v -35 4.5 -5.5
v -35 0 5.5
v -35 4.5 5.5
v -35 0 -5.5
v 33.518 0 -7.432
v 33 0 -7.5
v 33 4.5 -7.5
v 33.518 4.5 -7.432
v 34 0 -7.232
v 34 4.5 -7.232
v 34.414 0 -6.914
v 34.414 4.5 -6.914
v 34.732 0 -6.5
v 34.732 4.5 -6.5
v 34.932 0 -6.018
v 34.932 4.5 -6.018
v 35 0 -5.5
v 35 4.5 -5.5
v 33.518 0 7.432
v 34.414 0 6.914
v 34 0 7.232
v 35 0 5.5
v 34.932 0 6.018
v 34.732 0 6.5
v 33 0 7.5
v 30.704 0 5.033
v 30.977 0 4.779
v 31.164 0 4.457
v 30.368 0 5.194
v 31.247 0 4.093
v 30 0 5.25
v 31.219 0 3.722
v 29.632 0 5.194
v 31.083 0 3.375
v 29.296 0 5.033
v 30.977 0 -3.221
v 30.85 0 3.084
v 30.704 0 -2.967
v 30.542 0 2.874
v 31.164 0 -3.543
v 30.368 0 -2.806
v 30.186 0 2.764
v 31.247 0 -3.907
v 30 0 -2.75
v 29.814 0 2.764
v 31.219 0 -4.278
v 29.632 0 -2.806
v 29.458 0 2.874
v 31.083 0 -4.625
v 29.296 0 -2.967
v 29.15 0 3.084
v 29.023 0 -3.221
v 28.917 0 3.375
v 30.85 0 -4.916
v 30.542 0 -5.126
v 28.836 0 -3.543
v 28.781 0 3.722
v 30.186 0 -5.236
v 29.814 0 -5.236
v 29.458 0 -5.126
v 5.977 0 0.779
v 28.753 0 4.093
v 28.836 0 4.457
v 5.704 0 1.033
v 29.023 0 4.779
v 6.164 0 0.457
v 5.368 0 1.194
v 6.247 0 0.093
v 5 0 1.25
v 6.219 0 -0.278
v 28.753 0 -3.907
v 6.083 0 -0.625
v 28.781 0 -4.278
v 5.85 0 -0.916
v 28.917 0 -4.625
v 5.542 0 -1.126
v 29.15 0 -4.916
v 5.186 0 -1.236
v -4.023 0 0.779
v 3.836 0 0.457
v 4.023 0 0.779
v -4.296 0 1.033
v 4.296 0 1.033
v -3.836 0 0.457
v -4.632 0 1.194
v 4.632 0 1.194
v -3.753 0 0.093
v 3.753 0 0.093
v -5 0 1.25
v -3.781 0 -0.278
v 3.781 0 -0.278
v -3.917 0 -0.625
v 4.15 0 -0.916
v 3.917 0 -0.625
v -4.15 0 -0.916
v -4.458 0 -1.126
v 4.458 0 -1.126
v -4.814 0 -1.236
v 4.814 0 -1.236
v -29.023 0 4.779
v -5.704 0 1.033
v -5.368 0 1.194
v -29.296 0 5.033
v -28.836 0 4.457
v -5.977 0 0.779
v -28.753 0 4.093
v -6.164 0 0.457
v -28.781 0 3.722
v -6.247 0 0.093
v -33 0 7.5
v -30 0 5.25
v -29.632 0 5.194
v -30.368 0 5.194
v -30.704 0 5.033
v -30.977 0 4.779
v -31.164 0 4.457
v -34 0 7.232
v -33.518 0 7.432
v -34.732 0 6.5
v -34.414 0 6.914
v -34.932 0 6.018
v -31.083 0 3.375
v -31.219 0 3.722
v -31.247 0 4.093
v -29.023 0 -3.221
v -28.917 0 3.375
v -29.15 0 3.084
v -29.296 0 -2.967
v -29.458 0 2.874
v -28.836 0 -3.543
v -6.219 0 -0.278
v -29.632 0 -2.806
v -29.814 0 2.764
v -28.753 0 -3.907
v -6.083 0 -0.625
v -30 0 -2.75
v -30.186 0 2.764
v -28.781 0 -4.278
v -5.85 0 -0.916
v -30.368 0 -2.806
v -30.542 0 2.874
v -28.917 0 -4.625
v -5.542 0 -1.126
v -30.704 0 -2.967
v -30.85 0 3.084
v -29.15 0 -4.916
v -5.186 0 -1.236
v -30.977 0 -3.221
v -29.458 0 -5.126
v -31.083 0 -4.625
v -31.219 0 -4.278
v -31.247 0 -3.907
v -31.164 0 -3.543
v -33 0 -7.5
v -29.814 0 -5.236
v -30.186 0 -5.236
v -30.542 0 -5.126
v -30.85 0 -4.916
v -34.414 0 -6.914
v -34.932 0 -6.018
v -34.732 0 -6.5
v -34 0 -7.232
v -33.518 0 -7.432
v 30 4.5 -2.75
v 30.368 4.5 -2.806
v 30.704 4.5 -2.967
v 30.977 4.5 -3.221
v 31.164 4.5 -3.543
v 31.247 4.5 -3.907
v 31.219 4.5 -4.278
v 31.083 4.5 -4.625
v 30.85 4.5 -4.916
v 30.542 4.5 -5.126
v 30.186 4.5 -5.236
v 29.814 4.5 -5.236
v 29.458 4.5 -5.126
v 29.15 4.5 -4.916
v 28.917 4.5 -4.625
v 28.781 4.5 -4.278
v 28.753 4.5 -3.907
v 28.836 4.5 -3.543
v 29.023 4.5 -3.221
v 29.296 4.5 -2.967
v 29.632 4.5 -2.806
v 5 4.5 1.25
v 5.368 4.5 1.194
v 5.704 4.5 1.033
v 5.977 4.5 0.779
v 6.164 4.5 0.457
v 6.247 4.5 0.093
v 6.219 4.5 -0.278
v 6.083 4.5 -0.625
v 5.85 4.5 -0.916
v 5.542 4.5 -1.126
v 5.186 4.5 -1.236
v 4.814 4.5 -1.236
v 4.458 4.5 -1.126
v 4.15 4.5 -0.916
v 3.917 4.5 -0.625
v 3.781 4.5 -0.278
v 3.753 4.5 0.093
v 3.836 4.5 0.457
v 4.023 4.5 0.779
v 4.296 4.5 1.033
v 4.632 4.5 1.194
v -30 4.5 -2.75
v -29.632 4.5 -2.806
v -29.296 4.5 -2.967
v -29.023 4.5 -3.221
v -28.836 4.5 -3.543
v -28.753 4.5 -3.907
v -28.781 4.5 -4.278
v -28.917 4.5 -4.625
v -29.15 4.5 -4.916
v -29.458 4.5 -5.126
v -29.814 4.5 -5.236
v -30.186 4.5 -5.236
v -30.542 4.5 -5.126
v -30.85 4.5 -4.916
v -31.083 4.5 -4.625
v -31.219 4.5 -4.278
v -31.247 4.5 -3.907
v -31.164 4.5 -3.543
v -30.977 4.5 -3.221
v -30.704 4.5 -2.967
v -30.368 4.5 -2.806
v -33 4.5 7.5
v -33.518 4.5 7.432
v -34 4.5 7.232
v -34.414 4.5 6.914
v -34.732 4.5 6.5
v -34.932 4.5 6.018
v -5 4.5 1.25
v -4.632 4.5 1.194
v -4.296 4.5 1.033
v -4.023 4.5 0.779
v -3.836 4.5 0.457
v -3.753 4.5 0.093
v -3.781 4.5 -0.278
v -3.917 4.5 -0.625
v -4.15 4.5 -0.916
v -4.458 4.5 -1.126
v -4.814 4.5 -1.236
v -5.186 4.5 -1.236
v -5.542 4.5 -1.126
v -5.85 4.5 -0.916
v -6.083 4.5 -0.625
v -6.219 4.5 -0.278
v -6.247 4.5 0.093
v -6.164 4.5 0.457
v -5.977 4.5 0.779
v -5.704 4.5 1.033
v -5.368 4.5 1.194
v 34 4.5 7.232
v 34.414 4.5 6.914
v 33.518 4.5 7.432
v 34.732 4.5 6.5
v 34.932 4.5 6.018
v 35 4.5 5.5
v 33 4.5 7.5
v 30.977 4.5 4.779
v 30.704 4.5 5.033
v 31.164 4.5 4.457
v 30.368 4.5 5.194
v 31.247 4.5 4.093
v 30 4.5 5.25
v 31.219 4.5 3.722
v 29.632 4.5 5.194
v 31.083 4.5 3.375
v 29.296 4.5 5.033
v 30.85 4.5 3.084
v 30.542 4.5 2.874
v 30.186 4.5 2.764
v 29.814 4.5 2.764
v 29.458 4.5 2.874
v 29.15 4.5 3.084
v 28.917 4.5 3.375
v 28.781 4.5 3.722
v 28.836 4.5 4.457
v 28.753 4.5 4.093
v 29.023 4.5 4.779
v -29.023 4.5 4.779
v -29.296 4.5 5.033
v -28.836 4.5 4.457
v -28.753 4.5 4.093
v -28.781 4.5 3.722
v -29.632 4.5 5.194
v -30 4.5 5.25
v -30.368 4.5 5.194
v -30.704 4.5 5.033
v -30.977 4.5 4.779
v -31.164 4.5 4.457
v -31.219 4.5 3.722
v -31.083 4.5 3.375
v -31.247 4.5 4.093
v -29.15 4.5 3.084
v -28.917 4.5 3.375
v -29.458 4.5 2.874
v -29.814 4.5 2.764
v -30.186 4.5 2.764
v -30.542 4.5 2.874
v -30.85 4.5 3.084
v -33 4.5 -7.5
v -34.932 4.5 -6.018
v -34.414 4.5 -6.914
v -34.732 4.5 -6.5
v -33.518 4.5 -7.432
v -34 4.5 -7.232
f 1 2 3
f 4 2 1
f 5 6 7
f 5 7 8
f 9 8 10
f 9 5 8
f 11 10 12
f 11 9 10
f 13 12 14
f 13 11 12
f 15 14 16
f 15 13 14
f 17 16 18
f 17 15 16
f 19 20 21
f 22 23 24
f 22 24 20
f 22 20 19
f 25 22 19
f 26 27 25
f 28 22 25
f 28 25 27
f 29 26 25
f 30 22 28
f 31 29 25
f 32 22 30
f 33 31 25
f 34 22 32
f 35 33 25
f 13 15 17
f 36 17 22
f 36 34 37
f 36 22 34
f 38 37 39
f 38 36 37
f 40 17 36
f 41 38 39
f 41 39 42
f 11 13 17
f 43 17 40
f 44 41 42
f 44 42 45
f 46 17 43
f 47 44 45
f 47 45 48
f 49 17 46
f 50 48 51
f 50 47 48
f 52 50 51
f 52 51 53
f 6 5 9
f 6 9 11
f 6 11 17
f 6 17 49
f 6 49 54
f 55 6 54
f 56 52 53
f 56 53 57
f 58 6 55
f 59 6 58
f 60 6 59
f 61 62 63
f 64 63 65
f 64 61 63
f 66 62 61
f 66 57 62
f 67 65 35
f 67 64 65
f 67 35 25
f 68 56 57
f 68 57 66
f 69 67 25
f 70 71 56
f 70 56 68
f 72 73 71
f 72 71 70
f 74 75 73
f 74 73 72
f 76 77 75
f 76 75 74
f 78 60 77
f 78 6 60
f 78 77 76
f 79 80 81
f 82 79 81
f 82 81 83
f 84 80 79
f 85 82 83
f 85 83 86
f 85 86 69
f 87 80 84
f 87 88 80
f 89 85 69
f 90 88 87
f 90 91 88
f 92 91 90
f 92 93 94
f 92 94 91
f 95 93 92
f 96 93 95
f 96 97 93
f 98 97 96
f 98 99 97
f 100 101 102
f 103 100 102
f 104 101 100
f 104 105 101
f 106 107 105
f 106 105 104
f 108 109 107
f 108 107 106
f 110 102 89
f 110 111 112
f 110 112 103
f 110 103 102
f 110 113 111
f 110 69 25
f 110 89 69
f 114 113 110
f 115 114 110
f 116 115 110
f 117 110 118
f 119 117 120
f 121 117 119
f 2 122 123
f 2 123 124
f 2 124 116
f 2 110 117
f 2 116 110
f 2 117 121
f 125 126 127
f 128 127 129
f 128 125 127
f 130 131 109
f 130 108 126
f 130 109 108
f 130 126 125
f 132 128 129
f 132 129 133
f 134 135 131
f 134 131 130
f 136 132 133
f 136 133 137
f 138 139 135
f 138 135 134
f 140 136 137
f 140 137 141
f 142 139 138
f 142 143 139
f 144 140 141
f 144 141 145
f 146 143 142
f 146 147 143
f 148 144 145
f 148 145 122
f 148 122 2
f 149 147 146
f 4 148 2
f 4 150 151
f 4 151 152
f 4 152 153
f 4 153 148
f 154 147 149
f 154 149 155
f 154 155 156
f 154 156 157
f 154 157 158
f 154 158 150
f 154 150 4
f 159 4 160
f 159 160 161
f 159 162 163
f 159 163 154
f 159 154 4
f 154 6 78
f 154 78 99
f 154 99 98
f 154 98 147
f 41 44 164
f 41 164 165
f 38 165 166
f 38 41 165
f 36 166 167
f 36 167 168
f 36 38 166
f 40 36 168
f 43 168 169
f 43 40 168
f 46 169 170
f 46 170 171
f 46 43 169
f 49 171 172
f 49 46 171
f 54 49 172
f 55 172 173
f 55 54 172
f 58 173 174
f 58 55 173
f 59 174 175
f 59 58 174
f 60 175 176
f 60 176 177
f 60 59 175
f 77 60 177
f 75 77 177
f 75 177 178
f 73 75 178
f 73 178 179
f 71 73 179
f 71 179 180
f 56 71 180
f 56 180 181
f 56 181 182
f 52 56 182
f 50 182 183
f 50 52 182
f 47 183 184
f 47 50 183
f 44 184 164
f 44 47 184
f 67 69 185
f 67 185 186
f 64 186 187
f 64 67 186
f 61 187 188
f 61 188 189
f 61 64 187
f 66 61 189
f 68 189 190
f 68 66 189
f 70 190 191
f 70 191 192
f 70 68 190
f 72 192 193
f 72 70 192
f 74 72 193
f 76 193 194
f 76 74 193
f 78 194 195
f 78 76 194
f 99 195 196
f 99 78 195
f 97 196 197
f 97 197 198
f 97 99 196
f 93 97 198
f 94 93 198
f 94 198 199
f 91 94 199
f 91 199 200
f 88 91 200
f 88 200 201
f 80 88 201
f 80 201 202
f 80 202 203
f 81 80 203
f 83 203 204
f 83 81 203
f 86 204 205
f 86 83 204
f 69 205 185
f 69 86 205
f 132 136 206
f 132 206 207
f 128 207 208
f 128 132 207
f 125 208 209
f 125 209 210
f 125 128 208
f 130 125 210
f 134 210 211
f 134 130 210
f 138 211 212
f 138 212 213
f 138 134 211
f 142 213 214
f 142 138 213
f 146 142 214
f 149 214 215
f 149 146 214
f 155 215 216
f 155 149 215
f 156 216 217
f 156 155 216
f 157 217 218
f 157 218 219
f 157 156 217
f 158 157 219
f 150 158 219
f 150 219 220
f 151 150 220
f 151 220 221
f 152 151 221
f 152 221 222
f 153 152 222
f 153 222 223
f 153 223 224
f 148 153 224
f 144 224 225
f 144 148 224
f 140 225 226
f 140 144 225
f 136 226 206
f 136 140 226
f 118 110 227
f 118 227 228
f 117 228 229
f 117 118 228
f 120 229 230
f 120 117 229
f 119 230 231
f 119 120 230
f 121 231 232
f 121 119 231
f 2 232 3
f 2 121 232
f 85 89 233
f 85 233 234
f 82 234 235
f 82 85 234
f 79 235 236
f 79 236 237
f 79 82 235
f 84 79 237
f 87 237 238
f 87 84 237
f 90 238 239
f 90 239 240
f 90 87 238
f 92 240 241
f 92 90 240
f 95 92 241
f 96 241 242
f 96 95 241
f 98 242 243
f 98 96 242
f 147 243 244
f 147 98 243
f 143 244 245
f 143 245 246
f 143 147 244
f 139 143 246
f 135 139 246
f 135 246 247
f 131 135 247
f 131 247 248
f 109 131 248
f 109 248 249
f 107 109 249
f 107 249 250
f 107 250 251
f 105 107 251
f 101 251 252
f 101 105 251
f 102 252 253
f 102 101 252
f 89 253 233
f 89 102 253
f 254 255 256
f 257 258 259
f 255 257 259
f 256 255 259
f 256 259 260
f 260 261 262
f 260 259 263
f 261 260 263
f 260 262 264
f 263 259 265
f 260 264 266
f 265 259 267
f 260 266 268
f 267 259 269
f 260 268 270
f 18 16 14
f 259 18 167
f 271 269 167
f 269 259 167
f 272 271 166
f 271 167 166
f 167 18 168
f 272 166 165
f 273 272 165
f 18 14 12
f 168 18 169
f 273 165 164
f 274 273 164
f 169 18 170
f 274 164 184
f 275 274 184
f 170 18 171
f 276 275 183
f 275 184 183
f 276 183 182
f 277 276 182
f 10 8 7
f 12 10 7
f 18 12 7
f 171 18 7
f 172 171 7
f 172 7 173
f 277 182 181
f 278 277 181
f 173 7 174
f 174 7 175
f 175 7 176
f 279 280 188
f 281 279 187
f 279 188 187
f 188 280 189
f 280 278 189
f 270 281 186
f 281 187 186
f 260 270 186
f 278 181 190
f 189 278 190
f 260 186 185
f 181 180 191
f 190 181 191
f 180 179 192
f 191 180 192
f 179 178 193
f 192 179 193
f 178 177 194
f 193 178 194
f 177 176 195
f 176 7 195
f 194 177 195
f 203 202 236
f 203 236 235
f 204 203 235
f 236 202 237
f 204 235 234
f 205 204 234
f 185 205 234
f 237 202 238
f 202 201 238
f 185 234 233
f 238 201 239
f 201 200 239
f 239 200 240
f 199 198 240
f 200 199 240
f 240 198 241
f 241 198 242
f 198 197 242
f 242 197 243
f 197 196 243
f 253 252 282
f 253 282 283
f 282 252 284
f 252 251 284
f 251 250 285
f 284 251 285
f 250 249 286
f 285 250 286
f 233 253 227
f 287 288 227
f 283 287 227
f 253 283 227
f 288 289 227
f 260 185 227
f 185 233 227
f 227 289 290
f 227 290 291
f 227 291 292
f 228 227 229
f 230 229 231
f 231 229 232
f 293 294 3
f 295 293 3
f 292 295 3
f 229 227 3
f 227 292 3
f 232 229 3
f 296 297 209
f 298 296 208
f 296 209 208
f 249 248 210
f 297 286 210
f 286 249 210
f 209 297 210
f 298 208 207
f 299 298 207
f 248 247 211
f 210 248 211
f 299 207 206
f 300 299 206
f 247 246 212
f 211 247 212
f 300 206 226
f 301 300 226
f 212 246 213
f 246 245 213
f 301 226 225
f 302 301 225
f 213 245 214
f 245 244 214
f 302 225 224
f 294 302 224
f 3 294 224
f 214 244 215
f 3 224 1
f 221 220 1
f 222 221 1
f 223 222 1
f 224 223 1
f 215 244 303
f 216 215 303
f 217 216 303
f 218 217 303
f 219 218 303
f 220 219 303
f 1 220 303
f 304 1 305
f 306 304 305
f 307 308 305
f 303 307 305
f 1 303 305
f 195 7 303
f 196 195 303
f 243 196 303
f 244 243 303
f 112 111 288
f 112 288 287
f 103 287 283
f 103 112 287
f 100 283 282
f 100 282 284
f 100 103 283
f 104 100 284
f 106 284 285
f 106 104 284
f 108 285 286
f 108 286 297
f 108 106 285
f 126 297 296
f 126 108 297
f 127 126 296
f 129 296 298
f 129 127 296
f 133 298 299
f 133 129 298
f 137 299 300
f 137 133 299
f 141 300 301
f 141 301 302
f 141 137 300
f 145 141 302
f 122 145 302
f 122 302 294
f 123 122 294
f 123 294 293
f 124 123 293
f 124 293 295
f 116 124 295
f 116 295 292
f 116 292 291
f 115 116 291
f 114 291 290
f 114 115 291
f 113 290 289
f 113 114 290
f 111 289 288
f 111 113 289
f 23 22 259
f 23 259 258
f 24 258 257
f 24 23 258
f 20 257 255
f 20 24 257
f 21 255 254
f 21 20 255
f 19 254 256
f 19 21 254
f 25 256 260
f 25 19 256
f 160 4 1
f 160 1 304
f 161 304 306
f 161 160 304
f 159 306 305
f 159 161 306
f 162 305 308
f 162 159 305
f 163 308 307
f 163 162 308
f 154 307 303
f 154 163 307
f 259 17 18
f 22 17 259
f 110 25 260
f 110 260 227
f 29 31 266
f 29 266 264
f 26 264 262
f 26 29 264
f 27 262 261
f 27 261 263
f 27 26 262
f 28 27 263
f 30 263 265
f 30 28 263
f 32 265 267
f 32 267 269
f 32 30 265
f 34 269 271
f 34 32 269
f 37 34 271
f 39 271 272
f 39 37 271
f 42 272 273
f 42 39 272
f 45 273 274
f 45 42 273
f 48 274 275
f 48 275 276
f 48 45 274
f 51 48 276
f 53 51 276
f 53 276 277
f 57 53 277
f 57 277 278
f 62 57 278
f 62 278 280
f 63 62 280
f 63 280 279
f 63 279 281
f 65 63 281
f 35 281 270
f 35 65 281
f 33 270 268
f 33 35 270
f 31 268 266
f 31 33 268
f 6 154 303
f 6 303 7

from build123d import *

# Parameters (mm, degrees)
SKETCH_1_R      = 1.25
EXTRUDE_1_DEPTH = 4.5


with BuildPart() as part:
    # 草图1 → 凸台-拉伸1 (new body)
    with BuildSketch(Plane(origin=(0, 0, 0), x_dir=(1, 0, 0), z_dir=(0, 1, 0))):
        with BuildLine():
            Line((-33, 7.5), (33, 7.5))
            ThreePointArc((33, 7.5), (34.414213562, 6.914213562), (35, 5.5))
            Line((35, 5.5), (35, -5.5))
            ThreePointArc((35, -5.5), (34.414213562, -6.914213562), (33, -7.5))
            Line((33, -7.5), (-33, -7.5))
            ThreePointArc((-33, -7.5), (-34.414213562, -6.914213562), (-35, -5.5))
            Line((-35, -5.5), (-35, 5.5))
            ThreePointArc((-35, 5.5), (-34.414213562, 6.914213562), (-33, 7.5))
        make_face()
        with Locations(Location((-5, 0, 0), (0, 0, 270))):
            Circle(SKETCH_1_R, mode=Mode.SUBTRACT)
        with Locations(Location((5, 0, 0), (0, 0, 270))):
            Circle(SKETCH_1_R, mode=Mode.SUBTRACT)
        with Locations(Location((-30, 4, 0), (0, 0, 270))):
            Circle(SKETCH_1_R, mode=Mode.SUBTRACT)
        with Locations(Location((-30, -4, 0), (0, 0, 270))):
            Circle(SKETCH_1_R, mode=Mode.SUBTRACT)
        with Locations(Location((30, -4, 0), (0, 0, 270))):
            Circle(SKETCH_1_R, mode=Mode.SUBTRACT)
        with Locations(Location((30, 4, 0), (0, 0, 270))):
            Circle(SKETCH_1_R, mode=Mode.SUBTRACT)
    extrude(amount=EXTRUDE_1_DEPTH)


solid = part.part
